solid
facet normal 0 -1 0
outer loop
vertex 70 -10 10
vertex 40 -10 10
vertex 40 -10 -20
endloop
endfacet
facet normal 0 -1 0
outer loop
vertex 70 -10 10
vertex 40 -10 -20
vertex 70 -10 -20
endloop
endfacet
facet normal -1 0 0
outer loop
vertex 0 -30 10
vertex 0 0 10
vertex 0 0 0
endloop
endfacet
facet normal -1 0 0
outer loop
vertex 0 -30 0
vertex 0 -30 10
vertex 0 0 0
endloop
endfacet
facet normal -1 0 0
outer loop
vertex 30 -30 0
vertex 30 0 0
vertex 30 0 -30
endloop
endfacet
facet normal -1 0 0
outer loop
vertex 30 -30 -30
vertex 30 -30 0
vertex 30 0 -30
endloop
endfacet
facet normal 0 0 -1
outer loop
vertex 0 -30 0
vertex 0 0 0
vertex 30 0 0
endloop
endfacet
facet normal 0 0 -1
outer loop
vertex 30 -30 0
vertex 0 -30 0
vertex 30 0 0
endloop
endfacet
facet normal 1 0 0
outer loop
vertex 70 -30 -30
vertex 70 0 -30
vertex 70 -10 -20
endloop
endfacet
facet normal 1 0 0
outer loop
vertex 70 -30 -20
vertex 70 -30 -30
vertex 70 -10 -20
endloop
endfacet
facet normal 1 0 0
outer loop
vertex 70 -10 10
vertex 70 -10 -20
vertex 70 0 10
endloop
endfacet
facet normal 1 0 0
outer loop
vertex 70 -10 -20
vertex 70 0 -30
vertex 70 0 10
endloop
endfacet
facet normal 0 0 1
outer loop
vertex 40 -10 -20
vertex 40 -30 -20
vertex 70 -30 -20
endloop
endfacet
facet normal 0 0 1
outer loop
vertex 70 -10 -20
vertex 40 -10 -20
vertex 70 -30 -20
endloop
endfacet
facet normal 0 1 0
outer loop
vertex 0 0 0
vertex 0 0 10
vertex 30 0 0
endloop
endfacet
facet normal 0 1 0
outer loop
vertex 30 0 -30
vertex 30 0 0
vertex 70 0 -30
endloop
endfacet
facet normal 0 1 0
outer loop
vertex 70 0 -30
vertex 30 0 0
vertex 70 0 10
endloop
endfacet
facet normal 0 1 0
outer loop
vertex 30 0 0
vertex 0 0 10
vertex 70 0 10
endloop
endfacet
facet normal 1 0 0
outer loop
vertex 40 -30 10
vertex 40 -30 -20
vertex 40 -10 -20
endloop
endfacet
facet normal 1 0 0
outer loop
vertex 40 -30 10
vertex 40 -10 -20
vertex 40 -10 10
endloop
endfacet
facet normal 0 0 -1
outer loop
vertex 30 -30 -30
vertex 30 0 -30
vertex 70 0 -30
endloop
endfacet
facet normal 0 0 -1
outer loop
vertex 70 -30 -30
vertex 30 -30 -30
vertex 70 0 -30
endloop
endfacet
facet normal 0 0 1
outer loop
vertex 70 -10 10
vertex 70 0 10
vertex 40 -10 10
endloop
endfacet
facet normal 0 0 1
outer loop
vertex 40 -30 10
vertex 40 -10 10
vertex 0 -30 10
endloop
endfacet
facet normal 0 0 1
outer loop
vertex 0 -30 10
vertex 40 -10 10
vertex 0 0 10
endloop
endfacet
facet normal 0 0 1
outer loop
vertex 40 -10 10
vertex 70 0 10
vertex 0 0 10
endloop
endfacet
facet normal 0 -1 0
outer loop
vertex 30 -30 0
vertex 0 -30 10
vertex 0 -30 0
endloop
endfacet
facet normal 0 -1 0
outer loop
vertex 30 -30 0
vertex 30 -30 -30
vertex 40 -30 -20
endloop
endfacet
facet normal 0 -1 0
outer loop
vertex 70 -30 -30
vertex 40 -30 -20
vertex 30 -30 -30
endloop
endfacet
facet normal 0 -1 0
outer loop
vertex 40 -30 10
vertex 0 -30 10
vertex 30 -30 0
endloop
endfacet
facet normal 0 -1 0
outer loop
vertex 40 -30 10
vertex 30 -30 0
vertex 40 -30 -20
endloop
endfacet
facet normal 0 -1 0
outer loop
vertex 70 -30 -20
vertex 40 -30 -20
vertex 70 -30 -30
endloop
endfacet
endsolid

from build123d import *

# Parameters (mm, degrees)
F1_DEPTH = 30
F2_W     = 30
F2_H     = 30
F3_DEPTH = 20


with BuildPart() as f1:
    # F0 (on Front) → F1 (new body)
    with BuildSketch(Plane.XZ):
        Polygon((0, 10), (0, 0), (30, 0), (30, -30), (70, -30), (70, 10), align=None)
    extrude(amount=F1_DEPTH)

    # F2 (on face) → F3 (cut)
    with BuildSketch(Plane.XZ.offset(30)):
        with Locations((55, -5)):
            Rectangle(F2_W, F2_H)
    extrude(amount=-F3_DEPTH, mode=Mode.SUBTRACT)


solid = f1.part
